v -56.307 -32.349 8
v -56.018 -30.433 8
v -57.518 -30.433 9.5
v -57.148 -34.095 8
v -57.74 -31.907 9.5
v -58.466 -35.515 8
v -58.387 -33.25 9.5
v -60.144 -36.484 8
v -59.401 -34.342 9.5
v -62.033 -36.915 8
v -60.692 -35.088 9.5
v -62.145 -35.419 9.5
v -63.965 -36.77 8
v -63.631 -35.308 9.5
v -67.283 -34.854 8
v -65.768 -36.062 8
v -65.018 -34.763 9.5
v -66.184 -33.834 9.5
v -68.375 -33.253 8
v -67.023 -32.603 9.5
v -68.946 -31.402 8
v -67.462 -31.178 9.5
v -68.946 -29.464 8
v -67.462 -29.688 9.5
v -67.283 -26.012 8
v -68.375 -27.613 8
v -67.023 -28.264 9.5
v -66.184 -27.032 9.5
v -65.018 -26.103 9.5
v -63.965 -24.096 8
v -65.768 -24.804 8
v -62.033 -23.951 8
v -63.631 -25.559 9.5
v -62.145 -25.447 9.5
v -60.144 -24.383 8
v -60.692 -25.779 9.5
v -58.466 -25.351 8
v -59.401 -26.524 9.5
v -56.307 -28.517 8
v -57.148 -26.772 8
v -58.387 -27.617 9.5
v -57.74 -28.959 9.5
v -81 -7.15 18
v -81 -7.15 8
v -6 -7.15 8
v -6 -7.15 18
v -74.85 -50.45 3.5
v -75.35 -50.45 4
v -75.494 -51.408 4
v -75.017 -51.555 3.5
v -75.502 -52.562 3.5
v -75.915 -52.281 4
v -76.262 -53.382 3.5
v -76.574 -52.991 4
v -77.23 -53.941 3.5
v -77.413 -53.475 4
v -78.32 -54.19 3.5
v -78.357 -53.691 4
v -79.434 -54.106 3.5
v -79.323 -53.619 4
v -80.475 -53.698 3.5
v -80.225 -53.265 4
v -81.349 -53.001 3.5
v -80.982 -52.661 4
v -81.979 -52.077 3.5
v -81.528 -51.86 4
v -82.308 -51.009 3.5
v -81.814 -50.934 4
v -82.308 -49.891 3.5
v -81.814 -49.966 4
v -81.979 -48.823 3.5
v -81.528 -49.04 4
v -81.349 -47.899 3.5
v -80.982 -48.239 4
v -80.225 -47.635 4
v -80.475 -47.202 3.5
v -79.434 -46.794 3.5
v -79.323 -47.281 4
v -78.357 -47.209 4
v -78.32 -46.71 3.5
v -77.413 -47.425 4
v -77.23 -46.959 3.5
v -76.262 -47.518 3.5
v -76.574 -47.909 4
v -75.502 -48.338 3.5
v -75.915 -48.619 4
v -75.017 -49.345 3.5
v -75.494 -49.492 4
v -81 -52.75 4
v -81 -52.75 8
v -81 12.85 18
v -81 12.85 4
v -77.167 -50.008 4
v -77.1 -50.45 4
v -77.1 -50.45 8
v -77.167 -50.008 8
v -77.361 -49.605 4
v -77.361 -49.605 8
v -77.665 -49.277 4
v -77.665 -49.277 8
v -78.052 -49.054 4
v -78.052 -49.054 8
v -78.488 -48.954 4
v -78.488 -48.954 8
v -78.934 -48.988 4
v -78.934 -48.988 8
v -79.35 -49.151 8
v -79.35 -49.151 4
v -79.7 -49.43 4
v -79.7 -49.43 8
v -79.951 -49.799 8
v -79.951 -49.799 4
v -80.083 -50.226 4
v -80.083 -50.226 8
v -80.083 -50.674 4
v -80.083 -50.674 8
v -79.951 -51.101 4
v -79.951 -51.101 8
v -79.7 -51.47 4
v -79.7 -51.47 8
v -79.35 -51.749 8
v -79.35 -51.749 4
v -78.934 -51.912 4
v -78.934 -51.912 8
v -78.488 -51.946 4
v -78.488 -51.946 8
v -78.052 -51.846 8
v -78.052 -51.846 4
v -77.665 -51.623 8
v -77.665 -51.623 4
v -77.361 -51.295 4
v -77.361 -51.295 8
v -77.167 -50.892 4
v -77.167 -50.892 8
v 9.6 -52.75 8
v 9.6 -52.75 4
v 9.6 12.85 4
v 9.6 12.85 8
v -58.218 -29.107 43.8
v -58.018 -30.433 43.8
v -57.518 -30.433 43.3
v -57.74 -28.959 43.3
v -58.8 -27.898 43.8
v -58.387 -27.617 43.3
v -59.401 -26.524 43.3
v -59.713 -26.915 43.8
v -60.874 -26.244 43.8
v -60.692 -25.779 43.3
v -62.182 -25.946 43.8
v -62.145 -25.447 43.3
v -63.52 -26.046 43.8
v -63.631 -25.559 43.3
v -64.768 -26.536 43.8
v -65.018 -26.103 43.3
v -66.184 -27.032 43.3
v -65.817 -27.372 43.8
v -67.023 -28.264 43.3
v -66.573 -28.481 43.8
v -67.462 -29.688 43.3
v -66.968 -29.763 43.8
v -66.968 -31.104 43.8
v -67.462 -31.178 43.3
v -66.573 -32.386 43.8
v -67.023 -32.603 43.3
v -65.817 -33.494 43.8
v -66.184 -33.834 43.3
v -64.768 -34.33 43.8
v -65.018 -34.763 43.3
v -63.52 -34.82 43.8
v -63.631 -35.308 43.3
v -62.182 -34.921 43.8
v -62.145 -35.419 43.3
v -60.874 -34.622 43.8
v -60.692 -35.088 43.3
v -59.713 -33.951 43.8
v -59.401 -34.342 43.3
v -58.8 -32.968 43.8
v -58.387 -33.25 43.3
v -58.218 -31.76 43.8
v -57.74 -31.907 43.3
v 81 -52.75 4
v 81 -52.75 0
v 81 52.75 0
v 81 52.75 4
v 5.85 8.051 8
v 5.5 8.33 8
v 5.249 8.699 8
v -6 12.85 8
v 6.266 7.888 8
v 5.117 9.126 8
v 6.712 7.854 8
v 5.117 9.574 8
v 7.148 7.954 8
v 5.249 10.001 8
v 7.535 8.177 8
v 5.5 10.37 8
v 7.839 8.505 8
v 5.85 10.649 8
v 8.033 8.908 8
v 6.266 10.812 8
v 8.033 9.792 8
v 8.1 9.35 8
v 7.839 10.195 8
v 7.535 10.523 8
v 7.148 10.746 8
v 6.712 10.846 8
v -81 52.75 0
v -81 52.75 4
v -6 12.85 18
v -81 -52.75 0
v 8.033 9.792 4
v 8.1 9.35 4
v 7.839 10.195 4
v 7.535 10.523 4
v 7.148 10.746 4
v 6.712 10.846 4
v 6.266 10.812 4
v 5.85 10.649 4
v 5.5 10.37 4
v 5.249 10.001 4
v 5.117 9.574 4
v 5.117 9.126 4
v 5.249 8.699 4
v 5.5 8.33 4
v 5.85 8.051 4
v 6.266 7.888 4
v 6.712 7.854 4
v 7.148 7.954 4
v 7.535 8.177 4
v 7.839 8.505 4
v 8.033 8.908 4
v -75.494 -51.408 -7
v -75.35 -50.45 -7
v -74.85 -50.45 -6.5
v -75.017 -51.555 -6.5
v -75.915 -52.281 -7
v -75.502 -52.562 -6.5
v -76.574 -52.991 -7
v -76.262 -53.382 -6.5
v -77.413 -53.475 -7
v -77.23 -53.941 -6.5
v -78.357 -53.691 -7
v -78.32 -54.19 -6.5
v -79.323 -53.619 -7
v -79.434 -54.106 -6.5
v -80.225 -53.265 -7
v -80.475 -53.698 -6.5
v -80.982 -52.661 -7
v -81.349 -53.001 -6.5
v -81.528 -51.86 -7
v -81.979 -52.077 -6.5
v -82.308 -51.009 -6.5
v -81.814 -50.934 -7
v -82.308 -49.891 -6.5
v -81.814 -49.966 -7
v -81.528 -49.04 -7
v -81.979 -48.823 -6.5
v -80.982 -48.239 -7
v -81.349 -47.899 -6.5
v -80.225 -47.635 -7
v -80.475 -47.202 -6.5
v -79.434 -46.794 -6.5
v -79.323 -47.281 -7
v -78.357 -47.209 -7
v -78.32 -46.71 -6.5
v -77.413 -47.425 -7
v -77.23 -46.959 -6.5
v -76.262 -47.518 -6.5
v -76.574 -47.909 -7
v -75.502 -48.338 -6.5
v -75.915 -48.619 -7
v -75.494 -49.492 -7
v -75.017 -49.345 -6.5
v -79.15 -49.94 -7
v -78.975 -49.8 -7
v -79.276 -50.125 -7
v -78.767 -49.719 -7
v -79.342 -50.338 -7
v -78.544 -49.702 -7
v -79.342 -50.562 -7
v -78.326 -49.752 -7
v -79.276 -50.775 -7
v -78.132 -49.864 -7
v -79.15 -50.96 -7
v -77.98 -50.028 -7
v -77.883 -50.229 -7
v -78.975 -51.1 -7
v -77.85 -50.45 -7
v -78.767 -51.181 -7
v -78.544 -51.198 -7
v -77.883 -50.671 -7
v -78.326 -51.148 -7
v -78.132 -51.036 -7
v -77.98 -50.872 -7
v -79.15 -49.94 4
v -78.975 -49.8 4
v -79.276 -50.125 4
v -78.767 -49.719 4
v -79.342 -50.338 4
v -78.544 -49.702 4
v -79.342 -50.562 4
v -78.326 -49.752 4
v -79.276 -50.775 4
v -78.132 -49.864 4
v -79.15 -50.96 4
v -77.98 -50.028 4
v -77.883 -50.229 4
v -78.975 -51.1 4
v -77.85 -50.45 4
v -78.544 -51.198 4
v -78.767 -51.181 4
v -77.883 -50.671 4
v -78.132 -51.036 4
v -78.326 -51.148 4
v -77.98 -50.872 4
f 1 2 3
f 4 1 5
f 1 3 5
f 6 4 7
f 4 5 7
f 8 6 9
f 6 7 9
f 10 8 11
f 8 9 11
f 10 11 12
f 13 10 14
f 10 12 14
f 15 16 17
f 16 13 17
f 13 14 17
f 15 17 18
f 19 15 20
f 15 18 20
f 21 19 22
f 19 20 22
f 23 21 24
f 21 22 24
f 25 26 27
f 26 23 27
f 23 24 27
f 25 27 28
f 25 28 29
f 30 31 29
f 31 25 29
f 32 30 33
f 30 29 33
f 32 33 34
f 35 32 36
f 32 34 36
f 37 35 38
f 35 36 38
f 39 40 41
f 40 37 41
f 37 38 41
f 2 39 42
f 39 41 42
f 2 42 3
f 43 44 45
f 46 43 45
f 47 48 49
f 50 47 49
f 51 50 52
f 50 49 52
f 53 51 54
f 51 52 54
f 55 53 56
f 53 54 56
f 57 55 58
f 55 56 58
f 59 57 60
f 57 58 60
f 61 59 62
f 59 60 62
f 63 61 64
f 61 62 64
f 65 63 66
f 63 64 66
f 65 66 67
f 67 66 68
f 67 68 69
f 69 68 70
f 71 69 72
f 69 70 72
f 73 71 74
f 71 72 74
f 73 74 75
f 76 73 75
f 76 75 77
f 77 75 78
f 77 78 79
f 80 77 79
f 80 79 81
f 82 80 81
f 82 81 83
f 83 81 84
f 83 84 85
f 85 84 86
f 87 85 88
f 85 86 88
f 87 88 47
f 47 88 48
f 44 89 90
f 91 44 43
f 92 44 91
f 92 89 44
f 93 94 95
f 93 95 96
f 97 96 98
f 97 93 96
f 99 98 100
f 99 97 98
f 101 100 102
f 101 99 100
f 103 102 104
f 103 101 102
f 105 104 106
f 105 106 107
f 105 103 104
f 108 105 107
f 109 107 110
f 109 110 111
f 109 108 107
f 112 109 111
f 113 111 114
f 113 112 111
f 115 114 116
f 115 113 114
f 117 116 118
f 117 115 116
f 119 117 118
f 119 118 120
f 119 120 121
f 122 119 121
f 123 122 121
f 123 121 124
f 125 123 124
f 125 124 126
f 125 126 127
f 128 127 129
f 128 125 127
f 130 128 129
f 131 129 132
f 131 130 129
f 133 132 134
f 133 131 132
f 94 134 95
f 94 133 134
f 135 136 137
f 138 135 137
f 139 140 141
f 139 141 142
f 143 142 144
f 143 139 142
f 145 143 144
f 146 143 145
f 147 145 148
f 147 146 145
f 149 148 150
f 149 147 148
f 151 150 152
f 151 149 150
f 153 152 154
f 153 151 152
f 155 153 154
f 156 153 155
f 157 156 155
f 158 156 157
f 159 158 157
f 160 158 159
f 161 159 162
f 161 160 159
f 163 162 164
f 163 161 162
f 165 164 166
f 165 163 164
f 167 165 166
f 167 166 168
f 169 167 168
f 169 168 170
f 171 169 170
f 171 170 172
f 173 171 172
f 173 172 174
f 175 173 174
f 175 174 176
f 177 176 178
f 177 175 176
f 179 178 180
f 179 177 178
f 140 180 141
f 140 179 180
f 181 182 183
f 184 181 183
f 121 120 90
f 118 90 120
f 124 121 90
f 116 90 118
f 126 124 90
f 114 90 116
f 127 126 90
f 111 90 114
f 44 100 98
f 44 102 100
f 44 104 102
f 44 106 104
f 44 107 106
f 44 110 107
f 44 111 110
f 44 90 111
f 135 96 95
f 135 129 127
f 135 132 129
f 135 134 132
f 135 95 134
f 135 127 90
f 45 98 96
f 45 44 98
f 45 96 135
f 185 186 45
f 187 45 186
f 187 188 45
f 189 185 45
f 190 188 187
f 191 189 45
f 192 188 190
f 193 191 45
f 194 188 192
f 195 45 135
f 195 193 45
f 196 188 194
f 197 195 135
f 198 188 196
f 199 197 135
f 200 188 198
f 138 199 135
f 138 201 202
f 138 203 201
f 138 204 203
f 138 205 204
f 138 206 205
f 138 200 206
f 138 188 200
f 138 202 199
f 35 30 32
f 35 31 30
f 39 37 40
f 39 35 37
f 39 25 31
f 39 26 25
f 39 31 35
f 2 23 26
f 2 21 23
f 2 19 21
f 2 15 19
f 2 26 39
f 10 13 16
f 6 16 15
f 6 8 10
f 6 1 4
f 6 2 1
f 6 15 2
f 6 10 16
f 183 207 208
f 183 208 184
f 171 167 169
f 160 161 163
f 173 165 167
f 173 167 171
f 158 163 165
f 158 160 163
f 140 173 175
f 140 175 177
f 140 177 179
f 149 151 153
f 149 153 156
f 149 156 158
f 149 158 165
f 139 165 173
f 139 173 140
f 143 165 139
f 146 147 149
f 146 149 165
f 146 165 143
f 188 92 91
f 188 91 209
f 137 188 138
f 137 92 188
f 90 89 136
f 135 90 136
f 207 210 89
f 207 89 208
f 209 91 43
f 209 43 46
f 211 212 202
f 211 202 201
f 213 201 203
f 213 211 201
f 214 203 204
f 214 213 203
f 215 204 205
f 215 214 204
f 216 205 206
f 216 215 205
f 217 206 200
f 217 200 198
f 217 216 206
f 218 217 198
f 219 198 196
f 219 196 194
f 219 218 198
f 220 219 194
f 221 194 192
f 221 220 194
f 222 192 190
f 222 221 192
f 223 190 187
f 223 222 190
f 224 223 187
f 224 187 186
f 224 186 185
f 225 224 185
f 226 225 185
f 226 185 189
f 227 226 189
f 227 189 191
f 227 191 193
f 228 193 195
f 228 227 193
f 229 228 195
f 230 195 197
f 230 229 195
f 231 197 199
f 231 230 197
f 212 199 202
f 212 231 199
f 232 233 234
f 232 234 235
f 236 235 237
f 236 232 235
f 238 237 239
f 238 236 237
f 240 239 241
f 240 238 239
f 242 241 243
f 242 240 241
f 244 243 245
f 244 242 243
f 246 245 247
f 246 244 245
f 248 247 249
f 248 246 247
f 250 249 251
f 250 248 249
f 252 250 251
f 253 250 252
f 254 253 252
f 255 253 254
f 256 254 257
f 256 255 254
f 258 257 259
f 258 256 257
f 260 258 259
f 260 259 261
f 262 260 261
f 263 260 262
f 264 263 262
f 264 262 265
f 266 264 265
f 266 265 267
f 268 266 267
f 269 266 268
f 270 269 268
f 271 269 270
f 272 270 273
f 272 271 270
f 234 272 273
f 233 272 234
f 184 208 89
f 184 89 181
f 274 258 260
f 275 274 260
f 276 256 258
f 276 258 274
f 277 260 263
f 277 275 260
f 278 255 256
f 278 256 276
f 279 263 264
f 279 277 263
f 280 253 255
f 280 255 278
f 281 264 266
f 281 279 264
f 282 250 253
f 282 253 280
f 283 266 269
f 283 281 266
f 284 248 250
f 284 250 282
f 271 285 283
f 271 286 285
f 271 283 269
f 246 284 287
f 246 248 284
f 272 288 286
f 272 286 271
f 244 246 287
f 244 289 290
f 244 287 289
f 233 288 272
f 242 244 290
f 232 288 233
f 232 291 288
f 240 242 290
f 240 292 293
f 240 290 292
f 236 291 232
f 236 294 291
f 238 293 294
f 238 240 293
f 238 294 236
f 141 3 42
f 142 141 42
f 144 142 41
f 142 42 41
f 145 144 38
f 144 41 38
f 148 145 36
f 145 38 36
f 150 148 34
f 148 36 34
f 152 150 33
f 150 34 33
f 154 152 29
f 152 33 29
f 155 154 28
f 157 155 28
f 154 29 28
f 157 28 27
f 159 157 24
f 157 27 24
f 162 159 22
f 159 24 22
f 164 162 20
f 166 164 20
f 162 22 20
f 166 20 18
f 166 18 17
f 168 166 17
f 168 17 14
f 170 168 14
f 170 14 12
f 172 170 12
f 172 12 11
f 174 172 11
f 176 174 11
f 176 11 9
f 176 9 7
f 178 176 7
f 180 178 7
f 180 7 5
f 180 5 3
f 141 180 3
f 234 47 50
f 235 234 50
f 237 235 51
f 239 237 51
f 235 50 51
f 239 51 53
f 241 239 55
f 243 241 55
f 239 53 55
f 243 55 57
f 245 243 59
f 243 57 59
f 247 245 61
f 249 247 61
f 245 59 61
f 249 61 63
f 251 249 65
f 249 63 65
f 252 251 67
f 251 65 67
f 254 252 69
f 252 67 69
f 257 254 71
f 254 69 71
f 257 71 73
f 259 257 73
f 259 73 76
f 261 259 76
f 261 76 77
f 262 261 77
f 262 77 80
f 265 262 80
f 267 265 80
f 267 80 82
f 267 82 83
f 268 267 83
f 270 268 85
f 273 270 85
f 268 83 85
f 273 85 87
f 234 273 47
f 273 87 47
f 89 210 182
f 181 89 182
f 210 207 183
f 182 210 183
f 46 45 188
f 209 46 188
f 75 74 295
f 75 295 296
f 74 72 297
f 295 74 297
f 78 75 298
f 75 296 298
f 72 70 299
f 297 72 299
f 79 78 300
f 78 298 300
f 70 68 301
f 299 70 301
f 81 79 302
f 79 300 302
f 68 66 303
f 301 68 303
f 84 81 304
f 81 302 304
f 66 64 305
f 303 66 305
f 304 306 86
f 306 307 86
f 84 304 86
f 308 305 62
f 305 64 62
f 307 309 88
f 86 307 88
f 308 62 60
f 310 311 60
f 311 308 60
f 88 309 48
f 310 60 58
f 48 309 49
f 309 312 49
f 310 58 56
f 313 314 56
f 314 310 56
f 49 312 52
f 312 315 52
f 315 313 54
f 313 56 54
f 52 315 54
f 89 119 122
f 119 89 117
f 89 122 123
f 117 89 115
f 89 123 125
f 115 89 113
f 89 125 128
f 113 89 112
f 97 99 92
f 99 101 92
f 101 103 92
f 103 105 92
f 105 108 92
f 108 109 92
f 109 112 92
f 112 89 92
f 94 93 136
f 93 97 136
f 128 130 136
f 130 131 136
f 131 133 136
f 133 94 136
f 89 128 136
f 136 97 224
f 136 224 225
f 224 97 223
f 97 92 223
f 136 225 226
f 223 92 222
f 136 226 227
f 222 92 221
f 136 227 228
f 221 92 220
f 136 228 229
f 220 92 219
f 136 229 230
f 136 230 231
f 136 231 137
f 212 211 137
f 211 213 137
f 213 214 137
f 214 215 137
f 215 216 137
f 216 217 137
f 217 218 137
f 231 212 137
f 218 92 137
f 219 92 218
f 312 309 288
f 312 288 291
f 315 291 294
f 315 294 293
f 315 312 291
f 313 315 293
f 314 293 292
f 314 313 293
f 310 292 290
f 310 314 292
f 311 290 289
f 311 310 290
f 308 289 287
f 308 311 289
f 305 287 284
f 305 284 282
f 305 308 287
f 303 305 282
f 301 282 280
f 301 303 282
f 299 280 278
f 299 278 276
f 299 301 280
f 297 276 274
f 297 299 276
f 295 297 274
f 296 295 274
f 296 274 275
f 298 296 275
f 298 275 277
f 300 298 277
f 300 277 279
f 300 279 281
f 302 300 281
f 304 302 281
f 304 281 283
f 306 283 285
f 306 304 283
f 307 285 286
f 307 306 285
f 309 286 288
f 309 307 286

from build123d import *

# Parameters (mm, degrees)
F0_W      = 162
F0_H      = 105.5
F1_DEPTH  = 4
F2_W      = 90.6
F2_H      = 65.6
F2_R      = 1.5
F3_DEPTH  = 4
F4_W      = 75
F4_H      = 20
F5_DEPTH  = 10
F6_R      = 5
F7_DEPTH  = 35.8
F8_R      = 6.5
F8_R_2    = 5
F9_DEPTH  = 2
F9_TAPER  = 45
F10_SIZE  = 0.5
F11_R     = 3.75
F11_R_2   = 0.75
F12_DEPTH = 11
F14_SIZE  = 0.5


with BuildPart() as f1:
    # F0 (on Top) → F1 (new body)
    with BuildSketch(Plane.XY):
        Rectangle(F0_W, F0_H)
    extrude(amount=F1_DEPTH)


with BuildPart() as f3:
    # F2 (on face) → F3 (new body)
    with BuildSketch(Plane.XY.offset(4)):
        with Locations((-35.7, -19.95)):
            Rectangle(F2_W, F2_H)
        with Locations((-78.6, -50.45)):
            Circle(F2_R, mode=Mode.SUBTRACT)
        with Locations((6.6, 9.35)):
            Circle(F2_R, mode=Mode.SUBTRACT)
    extrude(amount=F3_DEPTH)

    # F4 (on face) → F5 (join)
    with BuildSketch(Plane.XY.offset(8)):
        with Locations((-43.5, 2.85)):
            Rectangle(F4_W, F4_H)
    extrude(amount=F5_DEPTH)


with BuildPart() as f7:
    # F6 (on face) → F7 (new body)
    with BuildSketch(Plane.XY.offset(8)):
        with Locations((-62.5183060765, -30.4331947118)):
            Circle(F6_R)
    extrude(amount=F7_DEPTH)

    # F8 (on face) → F9 (join)
    with BuildSketch(Plane(origin=(0, 0, 8), x_dir=(1, 0, 0), z_dir=(0, 0, -1))):
        with Locations((-62.5183060765, 30.4331947118)):
            Circle(F8_R)
        with Locations((-62.5183060765, 30.4331947118)):
            Circle(F8_R_2, mode=Mode.SUBTRACT)
        with Locations((-62.5183060765, 30.4331947118)):
            Circle(F8_R_2)
    extrude(amount=-F9_DEPTH, taper=F9_TAPER)

    # F10
    f10_edges = [f7.edges().sort_by_distance(p)[0] for p in [
        (-67.518306, -30.433195, 43.8),
    ]]
    chamfer(f10_edges, length=F10_SIZE)


with BuildPart() as f12:
    # F11 (on face) → F12 (new body)
    with BuildSketch(Plane(origin=(0, 0, 4), x_dir=(1, 0, 0), z_dir=(0, 0, -1))):
        with Locations((6.6, -9.35)):
            Circle(F11_R)
        with Locations((6.6, -9.35)):
            Circle(F11_R_2, mode=Mode.SUBTRACT)
    extrude(amount=F12_DEPTH)


with BuildPart() as f12b:
    # F11 (on face) → F12, piece 2 (new body)
    with BuildSketch(Plane(origin=(0, 0, 4), x_dir=(1, 0, 0), z_dir=(0, 0, -1))):
        with Locations((-78.6, 50.45)):
            Circle(F11_R)
        with Locations((-78.6, 50.45)):
            Circle(F11_R_2, mode=Mode.SUBTRACT)
    extrude(amount=F12_DEPTH)

    # F14
    f14_edges = [f12b.edges().sort_by_distance(p)[0] for p in [
        (-74.85, -50.45, -1.5),
        (-82.35, -50.45, 4),
        (-82.35, -50.45, -7),
    ]]
    chamfer(f14_edges, length=F14_SIZE)


solid = Compound([f1.part, f3.part, f7.part, f12b.part])
